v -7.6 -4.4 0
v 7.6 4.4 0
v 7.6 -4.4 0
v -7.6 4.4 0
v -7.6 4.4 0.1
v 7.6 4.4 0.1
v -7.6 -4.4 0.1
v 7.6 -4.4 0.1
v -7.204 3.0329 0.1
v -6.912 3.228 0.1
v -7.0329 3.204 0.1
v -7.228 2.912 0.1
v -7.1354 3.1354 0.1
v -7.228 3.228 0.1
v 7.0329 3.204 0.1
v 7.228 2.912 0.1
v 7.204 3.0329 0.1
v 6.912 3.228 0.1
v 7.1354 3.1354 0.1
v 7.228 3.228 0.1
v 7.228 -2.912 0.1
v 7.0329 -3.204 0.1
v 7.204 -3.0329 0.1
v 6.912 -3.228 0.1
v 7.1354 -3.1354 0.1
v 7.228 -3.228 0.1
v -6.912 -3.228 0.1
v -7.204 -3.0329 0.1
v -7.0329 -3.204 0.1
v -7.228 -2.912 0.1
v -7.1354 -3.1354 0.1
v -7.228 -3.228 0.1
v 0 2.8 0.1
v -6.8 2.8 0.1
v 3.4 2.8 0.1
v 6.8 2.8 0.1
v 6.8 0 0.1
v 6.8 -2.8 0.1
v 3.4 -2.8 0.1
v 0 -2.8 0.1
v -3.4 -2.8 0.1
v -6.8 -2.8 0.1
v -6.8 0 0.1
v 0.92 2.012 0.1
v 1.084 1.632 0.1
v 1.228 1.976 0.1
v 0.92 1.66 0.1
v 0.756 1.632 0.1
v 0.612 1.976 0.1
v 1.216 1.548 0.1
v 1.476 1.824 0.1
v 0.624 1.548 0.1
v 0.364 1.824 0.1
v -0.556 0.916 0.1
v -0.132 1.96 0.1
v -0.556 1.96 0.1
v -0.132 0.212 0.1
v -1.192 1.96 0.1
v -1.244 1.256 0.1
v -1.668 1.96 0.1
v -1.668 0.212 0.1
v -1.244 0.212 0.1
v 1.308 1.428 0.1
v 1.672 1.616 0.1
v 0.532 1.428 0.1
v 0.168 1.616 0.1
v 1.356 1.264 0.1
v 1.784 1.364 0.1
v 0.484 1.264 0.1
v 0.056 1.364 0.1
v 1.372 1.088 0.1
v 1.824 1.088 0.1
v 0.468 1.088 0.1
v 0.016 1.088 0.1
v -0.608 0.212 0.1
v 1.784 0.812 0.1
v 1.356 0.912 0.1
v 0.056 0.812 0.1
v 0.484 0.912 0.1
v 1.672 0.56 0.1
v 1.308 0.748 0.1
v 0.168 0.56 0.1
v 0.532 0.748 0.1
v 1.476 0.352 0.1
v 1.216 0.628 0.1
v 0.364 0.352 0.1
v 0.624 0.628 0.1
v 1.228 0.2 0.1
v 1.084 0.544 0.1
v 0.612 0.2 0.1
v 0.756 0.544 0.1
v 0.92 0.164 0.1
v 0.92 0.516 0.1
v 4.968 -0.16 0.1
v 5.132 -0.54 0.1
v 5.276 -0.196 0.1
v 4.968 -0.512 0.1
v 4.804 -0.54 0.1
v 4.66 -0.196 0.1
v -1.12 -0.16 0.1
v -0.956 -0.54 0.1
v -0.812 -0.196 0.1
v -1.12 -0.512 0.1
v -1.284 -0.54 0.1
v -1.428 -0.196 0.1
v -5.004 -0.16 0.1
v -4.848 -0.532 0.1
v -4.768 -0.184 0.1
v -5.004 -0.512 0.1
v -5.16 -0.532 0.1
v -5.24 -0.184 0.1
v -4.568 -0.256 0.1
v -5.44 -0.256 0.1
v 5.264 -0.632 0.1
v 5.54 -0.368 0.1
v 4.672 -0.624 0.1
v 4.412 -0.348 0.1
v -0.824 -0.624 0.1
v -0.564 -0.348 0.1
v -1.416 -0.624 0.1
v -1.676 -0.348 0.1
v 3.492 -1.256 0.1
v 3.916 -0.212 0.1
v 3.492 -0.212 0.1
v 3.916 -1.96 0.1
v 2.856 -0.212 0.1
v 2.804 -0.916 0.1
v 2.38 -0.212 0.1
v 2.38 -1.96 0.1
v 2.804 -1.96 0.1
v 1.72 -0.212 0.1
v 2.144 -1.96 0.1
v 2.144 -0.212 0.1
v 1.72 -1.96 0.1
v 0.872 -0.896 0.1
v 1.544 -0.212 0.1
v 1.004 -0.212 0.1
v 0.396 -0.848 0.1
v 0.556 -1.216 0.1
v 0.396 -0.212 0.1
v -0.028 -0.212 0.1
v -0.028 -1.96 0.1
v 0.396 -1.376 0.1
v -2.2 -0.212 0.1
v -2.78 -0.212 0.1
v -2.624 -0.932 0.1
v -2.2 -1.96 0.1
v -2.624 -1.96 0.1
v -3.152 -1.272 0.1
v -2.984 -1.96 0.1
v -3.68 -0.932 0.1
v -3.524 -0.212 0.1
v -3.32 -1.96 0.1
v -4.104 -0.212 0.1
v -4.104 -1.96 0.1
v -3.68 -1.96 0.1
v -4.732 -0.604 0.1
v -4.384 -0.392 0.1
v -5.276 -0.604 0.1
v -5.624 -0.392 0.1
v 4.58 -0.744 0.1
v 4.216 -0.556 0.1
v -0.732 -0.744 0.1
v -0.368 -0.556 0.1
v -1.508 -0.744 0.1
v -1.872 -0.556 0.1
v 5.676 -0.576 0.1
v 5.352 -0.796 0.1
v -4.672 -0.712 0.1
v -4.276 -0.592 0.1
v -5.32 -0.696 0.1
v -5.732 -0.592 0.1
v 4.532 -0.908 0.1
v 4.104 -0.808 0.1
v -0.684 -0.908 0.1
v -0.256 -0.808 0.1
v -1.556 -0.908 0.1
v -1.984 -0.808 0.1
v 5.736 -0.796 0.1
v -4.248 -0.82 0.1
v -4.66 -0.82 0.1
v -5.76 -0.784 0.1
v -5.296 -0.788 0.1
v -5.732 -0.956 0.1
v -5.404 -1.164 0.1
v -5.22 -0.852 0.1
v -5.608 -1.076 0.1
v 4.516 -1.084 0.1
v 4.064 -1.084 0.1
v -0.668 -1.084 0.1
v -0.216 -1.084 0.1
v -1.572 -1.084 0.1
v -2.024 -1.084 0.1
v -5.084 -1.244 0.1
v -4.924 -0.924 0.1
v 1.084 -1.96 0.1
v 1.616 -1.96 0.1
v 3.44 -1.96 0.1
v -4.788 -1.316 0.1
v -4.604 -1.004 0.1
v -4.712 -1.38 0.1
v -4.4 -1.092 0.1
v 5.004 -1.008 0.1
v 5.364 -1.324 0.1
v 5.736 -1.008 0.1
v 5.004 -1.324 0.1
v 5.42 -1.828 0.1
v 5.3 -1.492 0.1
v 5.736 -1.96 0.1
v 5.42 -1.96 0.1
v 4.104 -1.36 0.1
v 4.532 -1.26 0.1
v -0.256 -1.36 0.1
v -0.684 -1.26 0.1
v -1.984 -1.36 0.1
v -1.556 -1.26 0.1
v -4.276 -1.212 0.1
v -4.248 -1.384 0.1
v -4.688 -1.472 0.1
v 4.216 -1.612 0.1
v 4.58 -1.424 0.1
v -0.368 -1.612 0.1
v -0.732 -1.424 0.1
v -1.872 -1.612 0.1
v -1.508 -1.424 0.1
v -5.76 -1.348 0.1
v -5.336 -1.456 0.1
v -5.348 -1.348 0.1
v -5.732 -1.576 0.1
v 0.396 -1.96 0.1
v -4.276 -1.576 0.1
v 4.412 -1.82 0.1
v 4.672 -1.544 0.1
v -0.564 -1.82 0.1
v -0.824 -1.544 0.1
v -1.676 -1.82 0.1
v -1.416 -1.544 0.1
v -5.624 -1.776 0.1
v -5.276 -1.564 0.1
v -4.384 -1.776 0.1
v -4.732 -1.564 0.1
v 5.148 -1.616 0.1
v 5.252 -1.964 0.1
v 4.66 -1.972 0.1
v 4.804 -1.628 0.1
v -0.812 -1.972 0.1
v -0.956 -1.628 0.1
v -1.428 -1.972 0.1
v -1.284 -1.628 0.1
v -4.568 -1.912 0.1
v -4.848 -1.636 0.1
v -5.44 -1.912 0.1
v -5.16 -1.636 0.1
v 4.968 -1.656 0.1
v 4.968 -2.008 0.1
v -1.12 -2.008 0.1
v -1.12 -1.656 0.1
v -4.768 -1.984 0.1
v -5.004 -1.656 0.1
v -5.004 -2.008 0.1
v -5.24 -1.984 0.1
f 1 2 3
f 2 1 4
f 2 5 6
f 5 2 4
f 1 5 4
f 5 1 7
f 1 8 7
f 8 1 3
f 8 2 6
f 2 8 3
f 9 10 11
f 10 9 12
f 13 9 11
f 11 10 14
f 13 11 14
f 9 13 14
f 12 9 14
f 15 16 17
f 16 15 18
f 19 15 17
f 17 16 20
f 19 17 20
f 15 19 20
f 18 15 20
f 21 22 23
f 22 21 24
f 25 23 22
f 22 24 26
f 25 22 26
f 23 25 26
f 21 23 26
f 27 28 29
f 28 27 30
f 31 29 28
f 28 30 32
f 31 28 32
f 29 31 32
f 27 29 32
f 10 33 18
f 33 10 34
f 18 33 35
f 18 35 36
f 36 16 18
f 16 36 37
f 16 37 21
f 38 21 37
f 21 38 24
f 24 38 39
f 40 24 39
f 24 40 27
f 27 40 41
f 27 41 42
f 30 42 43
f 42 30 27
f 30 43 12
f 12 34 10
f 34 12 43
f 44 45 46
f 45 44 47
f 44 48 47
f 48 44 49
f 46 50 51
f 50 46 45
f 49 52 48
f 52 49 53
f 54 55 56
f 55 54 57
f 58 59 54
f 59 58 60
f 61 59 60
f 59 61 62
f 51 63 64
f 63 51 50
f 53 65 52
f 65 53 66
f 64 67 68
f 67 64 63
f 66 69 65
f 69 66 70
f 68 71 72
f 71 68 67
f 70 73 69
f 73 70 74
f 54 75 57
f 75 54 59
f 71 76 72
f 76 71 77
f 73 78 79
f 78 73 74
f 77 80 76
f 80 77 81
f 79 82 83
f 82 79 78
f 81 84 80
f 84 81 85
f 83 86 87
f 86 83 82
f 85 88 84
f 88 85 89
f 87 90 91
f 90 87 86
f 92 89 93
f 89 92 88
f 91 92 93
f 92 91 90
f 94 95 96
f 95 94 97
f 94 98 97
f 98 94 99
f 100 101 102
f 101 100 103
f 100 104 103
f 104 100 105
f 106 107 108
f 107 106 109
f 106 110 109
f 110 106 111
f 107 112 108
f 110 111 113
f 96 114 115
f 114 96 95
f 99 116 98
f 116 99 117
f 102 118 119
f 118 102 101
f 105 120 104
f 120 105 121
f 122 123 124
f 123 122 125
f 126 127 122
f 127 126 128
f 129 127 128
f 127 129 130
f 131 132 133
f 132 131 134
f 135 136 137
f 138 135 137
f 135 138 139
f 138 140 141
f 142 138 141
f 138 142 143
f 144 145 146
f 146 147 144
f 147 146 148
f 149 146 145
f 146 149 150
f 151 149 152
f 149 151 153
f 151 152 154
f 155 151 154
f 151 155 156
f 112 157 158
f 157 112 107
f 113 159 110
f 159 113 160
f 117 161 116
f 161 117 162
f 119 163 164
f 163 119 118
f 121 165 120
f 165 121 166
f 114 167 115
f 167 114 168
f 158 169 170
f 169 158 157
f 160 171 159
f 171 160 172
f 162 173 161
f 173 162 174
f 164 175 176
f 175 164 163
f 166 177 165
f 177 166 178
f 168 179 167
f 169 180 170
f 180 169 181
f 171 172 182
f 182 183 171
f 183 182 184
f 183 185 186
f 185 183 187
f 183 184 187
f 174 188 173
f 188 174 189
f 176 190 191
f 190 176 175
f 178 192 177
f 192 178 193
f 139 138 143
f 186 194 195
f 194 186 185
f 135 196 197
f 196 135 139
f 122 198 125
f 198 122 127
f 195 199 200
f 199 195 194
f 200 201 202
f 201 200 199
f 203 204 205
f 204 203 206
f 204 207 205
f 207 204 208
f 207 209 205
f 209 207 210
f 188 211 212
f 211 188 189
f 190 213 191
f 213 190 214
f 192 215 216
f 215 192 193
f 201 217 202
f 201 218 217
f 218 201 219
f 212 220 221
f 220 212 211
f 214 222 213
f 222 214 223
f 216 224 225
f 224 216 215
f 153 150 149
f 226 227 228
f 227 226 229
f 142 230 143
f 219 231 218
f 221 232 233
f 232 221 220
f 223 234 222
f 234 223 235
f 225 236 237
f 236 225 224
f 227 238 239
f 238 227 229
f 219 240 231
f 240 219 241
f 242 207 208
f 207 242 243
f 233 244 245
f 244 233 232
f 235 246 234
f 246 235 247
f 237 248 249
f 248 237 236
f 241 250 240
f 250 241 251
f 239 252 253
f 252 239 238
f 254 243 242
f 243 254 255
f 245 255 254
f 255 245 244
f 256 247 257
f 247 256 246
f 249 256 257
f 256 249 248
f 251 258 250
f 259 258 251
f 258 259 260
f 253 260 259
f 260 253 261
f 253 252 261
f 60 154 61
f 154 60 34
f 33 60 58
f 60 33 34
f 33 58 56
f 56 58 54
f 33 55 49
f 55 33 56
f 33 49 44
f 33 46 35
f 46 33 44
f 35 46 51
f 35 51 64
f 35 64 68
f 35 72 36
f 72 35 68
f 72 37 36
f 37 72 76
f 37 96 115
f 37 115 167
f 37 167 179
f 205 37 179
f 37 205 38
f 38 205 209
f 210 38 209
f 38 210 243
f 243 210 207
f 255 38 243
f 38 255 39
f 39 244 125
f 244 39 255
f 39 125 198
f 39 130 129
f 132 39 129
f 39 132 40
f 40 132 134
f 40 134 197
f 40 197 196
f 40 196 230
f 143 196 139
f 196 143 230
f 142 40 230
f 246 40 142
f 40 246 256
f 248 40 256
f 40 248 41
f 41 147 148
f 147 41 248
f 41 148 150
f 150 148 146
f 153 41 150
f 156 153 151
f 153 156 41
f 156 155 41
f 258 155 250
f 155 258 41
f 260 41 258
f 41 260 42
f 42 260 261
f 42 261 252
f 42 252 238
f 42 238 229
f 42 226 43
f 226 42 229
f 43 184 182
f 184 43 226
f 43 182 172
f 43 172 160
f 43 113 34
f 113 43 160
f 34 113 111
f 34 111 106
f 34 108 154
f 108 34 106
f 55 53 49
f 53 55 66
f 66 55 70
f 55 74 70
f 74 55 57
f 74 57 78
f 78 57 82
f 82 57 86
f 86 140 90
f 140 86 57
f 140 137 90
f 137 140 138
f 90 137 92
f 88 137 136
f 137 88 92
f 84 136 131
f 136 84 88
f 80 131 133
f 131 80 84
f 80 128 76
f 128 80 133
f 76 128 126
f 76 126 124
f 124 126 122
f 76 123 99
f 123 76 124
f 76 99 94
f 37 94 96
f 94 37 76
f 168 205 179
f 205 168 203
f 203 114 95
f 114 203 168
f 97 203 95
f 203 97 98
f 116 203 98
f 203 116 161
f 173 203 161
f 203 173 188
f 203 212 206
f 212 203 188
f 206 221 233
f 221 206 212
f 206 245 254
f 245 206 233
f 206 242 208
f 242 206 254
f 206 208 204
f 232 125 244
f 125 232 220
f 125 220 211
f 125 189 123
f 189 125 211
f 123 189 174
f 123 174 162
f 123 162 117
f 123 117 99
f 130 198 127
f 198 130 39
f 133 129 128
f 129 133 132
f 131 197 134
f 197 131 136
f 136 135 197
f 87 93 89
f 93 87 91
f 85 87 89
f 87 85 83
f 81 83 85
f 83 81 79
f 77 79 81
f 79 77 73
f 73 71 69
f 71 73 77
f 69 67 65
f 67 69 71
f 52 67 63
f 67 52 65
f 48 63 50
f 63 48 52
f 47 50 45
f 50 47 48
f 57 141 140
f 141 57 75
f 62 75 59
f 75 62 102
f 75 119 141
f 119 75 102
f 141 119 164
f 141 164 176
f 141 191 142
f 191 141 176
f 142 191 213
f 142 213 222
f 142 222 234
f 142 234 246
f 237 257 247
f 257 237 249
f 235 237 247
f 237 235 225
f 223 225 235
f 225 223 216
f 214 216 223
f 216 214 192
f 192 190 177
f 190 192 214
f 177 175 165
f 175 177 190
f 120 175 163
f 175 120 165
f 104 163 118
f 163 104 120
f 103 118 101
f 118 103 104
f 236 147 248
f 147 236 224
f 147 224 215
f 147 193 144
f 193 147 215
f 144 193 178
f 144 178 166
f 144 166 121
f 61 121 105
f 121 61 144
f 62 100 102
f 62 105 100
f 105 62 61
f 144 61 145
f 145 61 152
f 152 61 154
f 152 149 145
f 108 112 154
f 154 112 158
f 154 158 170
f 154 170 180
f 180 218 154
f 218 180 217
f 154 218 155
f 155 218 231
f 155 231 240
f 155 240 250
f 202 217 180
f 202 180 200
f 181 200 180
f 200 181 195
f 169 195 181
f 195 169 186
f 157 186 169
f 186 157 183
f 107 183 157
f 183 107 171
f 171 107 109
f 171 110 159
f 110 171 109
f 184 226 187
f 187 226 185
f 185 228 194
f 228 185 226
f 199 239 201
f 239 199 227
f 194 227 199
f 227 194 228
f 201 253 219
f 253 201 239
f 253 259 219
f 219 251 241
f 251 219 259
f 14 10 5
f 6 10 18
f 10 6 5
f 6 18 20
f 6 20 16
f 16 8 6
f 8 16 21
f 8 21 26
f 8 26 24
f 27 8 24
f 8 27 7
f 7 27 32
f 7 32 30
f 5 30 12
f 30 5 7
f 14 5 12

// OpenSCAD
// file: ../p/1-4ndis.scad
use <../lib.scad>
function ldraw_lib__1_4ndis() = [
// 0 Disc Negative 0.25
// 0 Name: 1-4ndis.dat
// 0 Author: James Jessiman
// 0 !LDRAW_ORG Primitive UPDATE 2012-01
// 0 !LICENSE Licensed under CC BY 4.0 : see CAreadme.txt
// 
// 0 BFC CERTIFY CCW
  [0,"BFC","CERTIFY"],
  [0,"BFC","CCW"],
// 
// 0 !HISTORY 2002-03-23 [sbliss] Added BFC Statement
// 0 !HISTORY 2002-04-25 [PTadmin] Official Update 2002-02
// 0 !HISTORY 2007-06-22 [PTadmin] Header formatted for Contributor Agreement
// 0 !HISTORY 2008-07-01 [PTadmin] Official Update 2008-01
// 0 !HISTORY 2012-02-16 [Philo] Changed to CCW
// 0 !HISTORY 2012-03-30 [PTadmin] Official Update 2012-01
// 
// 
// 3 16 0.9239 0 0.3827 1 0 0 1 0 1
  [3,16,0.9239,0,0.3827,1,0,0,1,0,1],
// 3 16 0.7071 0 0.7071 0.9239 0 0.3827 1 0 1
  [3,16,0.7071,0,0.7071,0.9239,0,0.3827,1,0,1],
// 3 16 0.3827 0 0.9239 0.7071 0 0.7071 1 0 1
  [3,16,0.3827,0,0.9239,0.7071,0,0.7071,1,0,1],
// 3 16 0 0 1 0.3827 0 0.9239 1 0 1
  [3,16,0,0,1,0.3827,0,0.9239,1,0,1],
];
module ldraw_lib__1_4ndis(step=0, col=false, unit=2/5, alt=false, line=0.2, solid=!$preview)
    makepoly(ldraw_lib__1_4ndis(), step=step, col=col, unit=unit, alt=alt, line=line, solid=solid);
ldraw_lib__1_4ndis(line=0.2);
// file: ../p/1-4chrd.scad
use <../lib.scad>
function ldraw_lib__1_4chrd() = [
// 0 Chord 0.25
// 0 Name: 1-4chrd.dat
// 0 Author: Max Martin Richter [MMR1988]
// 0 !LDRAW_ORG Primitive UPDATE 2023-05
// 0 !LICENSE Licensed under CC BY 4.0 : see CAreadme.txt
// 
// 0 BFC CERTIFY CCW
  [0,"BFC","CERTIFY"],
  [0,"BFC","CCW"],
// 
// 0 !HISTORY 2004-04-22 [PTadmin] Official Update 2004-02
// 0 !HISTORY 2007-10-09 [PTadmin] Header formatted for Contributor Agreement
// 0 !HISTORY 2008-07-01 [PTadmin] Official Update 2008-01
// 0 !HISTORY 2012-08-02 [MMR1988] Re-creation with PrimGen2 and Rectifier
// 0 !HISTORY 2012-08-09 [PTadmin] Official Update 2012-02
// 0 !HISTORY 2023-10-27 [OrionP] Change author to MMR1988 from hafhead
// 0 !HISTORY 2023-10-31 [OrionP] Official Update 2023-05
// 
// 4 16 0.9239 0 0.3827 0.3827 0 0.9239 0 0 1 1 0 0
  [4,16,0.9239,0,0.3827,0.3827,0,0.9239,0,0,1,1,0,0],
// 3 16 0.7071 0 0.7071 0.3827 0 0.9239 0.9239 0 0.3827
  [3,16,0.7071,0,0.7071,0.3827,0,0.9239,0.9239,0,0.3827],
];
module ldraw_lib__1_4chrd(step=0, col=false, unit=2/5, alt=false, line=0.2, solid=!$preview)
    makepoly(ldraw_lib__1_4chrd(), step=step, col=col, unit=unit, alt=alt, line=line, solid=solid);
ldraw_lib__1_4chrd(line=0.2);
// file: ../p/box5-12.scad
use <../lib.scad>
function ldraw_lib__box5_12() = [
// 0 Box with 5 Faces without Any Edges
// 0 Name: box5-12.dat
// 0 Author: Chris Dee [cwdee]
// 0 !LDRAW_ORG Primitive UPDATE 2009-02
// 0 !LICENSE Licensed under CC BY 4.0 : see CAreadme.txt
// 
// 0 BFC CERTIFY CCW
  [0,"BFC","CERTIFY"],
  [0,"BFC","CCW"],
// 
// 0 !HISTORY 2009-09-03 [PTadmin] Official Update 2009-02
// 
// 
// 4 16 1 1 1 1 1 -1 -1 1 -1 -1 1 1
  [4,16,1,1,1,1,1,-1,-1,1,-1,-1,1,1],
// 4 16 -1 0 1 1 0 1 1 1 1 -1 1 1
  [4,16,-1,0,1,1,0,1,1,1,1,-1,1,1],
// 4 16 -1 0 -1 -1 0 1 -1 1 1 -1 1 -1
  [4,16,-1,0,-1,-1,0,1,-1,1,1,-1,1,-1],
// 4 16 1 0 -1 -1 0 -1 -1 1 -1 1 1 -1
  [4,16,1,0,-1,-1,0,-1,-1,1,-1,1,1,-1],
// 4 16 1 0 1 1 0 -1 1 1 -1 1 1 1
  [4,16,1,0,1,1,0,-1,1,1,-1,1,1,1],
// 0
];
module ldraw_lib__box5_12(step=0, col=false, unit=2/5, alt=false, line=0.2, solid=!$preview)
    makepoly(ldraw_lib__box5_12(), step=step, col=col, unit=unit, alt=alt, line=line, solid=solid);
ldraw_lib__box5_12(line=0.2);
// main file
use <../lib.scad>
use <../p/box5-12.scad>
use <s/197915bs01.scad>
function ldraw_lib__192375h() = [
// 0 Sticker  1.1 x  1.9 with Black "NO SMOKING" and Border on White Background
// 0 Name: 192375h.dat
// 0 Author: Takeshi Takahashi [RainbowDolphin]
// 0 !LDRAW_ORG Part UPDATE 2024-08
// 0 !LICENSE Licensed under CC BY 4.0 : see CAreadme.txt
// 
// 0 BFC CERTIFY CCW
  [0,"BFC","CERTIFY"],
  [0,"BFC","CCW"],
// 
// 0 !KEYWORDS Bricklink 6375.2stk01, Brickowl 157647, Exxon, Gas Station
// 0 !KEYWORDS Rebrickable 192375, Set 6375-2
// 
// 0 !HISTORY 2021-06-05 [RainbowDolphin] Created based on 197915b by N. W. Perry [Plastikean]
// 0 !HISTORY 2024-09-30 [OrionP] Official Update 2024-08
// 
// 
// 1 16 0 -.25 0 19 0 0 0 .25 0 0 0 11 box5-12.dat
  [1,16,0,-.25,0,19,0,0,0,.25,0,0,0,11, ldraw_lib__box5_12()],
// 
// 1 15 0 -.25 0 1 0 0 0 1 0 0 0 1 s\197915bs01.dat
  [1,15,0,-.25,0,1,0,0,0,1,0,0,0,1, ldraw_lib__s__197915bs01()],
// 
// 3 15 -18.07 -.25 8.07 -17.28 -.25 8.07 -19 -.25 11
  [3,15,-18.07,-.25,8.07,-17.28,-.25,8.07,-19,-.25,11],
// 4 15 -19 -.25 11 -17.28 -.25 8.07 17.28 -.25 8.07 19 -.25 11
  [4,15,-19,-.25,11,-17.28,-.25,8.07,17.28,-.25,8.07,19,-.25,11],
// 3 15 19 -.25 11 17.28 -.25 8.07 18.07 -.25 8.07
  [3,15,19,-.25,11,17.28,-.25,8.07,18.07,-.25,8.07],
// 3 15 19 -.25 11 18.07 -.25 8.07 18.07 -.25 7.28
  [3,15,19,-.25,11,18.07,-.25,8.07,18.07,-.25,7.28],
// 4 15 19 -.25 11 18.07 -.25 7.28 18.07 -.25 -7.28 19 -.25 -11
  [4,15,19,-.25,11,18.07,-.25,7.28,18.07,-.25,-7.28,19,-.25,-11],
// 3 15 19 -.25 -11 18.07 -.25 -7.28 18.07 -.25 -8.07
  [3,15,19,-.25,-11,18.07,-.25,-7.28,18.07,-.25,-8.07],
// 3 15 19 -.25 -11 18.07 -.25 -8.07 17.28 -.25 -8.07
  [3,15,19,-.25,-11,18.07,-.25,-8.07,17.28,-.25,-8.07],
// 4 15 19 -.25 -11 17.28 -.25 -8.07 -17.28 -.25 -8.07 -19 -.25 -11
  [4,15,19,-.25,-11,17.28,-.25,-8.07,-17.28,-.25,-8.07,-19,-.25,-11],
// 3 15 -19 -.25 -11 -17.28 -.25 -8.07 -18.07 -.25 -8.07
  [3,15,-19,-.25,-11,-17.28,-.25,-8.07,-18.07,-.25,-8.07],
// 3 15 -19 -.25 -11 -18.07 -.25 -8.07 -18.07 -.25 -7.28
  [3,15,-19,-.25,-11,-18.07,-.25,-8.07,-18.07,-.25,-7.28],
// 4 15 -19 -.25 -11 -18.07 -.25 -7.28 -18.07 -.25 7.28 -19 -.25 11
  [4,15,-19,-.25,-11,-18.07,-.25,-7.28,-18.07,-.25,7.28,-19,-.25,11],
// 3 15 -18.07 -.25 8.07 -19 -.25 11 -18.07 -.25 7.28
  [3,15,-18.07,-.25,8.07,-19,-.25,11,-18.07,-.25,7.28],
];
module ldraw_lib__192375h(step=0, col=false, unit=2/5, alt=false, line=0.2, solid=!$preview)
    makepoly(ldraw_lib__192375h(), step=step, col=col, unit=unit, alt=alt, line=line, solid=solid);
ldraw_lib__192375h(line=0.2);
